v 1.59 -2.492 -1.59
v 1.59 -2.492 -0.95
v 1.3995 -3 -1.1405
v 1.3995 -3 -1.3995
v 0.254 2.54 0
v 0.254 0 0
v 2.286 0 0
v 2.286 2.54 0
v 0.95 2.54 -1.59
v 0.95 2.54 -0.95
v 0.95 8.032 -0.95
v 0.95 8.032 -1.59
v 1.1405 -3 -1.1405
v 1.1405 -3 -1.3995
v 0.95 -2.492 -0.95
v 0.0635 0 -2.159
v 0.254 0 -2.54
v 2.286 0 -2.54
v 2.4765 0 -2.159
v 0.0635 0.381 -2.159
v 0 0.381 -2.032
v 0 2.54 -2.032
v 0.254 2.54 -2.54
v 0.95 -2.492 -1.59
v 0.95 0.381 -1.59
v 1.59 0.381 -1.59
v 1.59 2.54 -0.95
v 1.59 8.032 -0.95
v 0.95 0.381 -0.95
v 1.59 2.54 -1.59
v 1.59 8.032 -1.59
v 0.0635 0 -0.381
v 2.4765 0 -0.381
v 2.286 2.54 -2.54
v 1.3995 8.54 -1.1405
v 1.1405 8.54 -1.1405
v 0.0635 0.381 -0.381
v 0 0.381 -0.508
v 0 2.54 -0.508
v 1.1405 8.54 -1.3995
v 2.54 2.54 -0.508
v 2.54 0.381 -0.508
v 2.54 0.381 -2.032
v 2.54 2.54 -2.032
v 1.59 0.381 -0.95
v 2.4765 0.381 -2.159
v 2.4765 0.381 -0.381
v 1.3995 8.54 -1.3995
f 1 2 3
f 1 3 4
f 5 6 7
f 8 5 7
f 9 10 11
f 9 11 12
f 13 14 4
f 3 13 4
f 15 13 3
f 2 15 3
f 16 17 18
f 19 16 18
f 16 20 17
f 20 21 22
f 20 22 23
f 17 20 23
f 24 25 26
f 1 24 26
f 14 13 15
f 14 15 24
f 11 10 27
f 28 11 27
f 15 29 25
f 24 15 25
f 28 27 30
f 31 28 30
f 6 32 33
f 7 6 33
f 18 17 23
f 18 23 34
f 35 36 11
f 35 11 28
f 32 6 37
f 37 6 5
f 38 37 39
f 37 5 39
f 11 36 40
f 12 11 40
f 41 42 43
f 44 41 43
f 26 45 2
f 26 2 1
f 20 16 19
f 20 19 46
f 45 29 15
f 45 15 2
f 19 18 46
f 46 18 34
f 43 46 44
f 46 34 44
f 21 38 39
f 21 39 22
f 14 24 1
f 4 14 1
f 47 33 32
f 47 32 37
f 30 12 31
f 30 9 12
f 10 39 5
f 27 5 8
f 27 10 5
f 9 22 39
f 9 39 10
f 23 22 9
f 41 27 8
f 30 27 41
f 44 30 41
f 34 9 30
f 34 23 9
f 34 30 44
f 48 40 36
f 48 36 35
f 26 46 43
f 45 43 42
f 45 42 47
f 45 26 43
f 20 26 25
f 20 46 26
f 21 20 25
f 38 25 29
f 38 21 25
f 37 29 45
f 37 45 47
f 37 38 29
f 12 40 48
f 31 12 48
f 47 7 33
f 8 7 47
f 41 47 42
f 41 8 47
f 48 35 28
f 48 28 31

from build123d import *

# Parameters (mm, degrees)
SKETCH1_W             = 2.54
SKETCH1_H             = 2.54
MAIN_BODY_DEPTH       = 2.54
SKETCH3_W             = 1.778
SKETCH3_H             = 0.381
CUT_EXTRUDE1_DEPTH    = 3.54
CUT_EXTRUDE2_DEPTH    = 3.54
SKETCH2_W             = 0.64
SKETCH2_H             = 0.64
PIN_DEPTH             = 6
PIN_DEPTH_BACK        = 5.54
CHAMFER1_SIZE         = 0.508
CHAMFER1_SIZE2        = 0.1905
CHAMFER1_PART_2_SIZE  = 0.508
CHAMFER1_PART_2_SIZE2 = 0.1905
CHAMFER1_PART_3_SIZE  = 0.508
CHAMFER1_PART_3_SIZE2 = 0.1905
CHAMFER1_PART_4_SIZE  = 0.508
CHAMFER1_PART_4_SIZE2 = 0.1905
CHAMFER2_SIZE         = 0.1905
CHAMFER2_SIZE2        = 0.508


with BuildPart() as part:
    # Sketch1 → Main Body (new body)
    with BuildSketch(Plane(origin=(0, 0, 0), x_dir=(1, 0, 0), z_dir=(0, 1, 0))):
        with Locations((1.27, 1.27)):
            Rectangle(SKETCH1_W, SKETCH1_H)
    extrude(amount=MAIN_BODY_DEPTH)

    # Sketch3 → Cut-Extrude1 (cut, through all)
    with BuildSketch(Plane.ZY):
        with Locations((-1.27, 0.1905)):
            Rectangle(SKETCH3_W, SKETCH3_H)
    extrude(amount=-CUT_EXTRUDE1_DEPTH, mode=Mode.SUBTRACT)

    # Sketch4 → Cut-Extrude2 (cut, through all)
    with BuildSketch(Plane(origin=(0, 2.54, 0), x_dir=(1, 0, 0), z_dir=(0, 1, 0))):
        Polygon((0.254, 2.54), (0, 2.54), (0, 2.032), align=None)
        Polygon((2.54, 2.54), (2.286, 2.54), (2.54, 2.032), align=None)
        Polygon((0.254, 0), (0, 0.508), (0, 0), align=None)
        Polygon((2.54, 0), (2.286, 0), (2.54, 0.508), align=None)
    extrude(amount=-CUT_EXTRUDE2_DEPTH, mode=Mode.SUBTRACT)

    # Sketch2 → Pin (add, two sides)
    with BuildSketch(Plane(origin=(0, 2.54, 0), x_dir=(1, 0, 0), z_dir=(0, 1, 0))) as pin_sk:
        with Locations((1.27, 1.27)):
            Rectangle(SKETCH2_W, SKETCH2_H)
    extrude(amount=PIN_DEPTH)
    extrude(pin_sk.sketch, amount=-PIN_DEPTH_BACK)

    # Chamfer1
    chamfer1_edges = [part.edges().sort_by_distance(p)[0] for p in [
        (0.95, 8.54, -1.27),
    ]]
    chamfer1_side = [part.faces().sort_by_distance(p)[0] for p in [
        (0.95, 5.54, -1.27),
    ]]
    chamfer(chamfer1_edges, length=CHAMFER1_SIZE, length2=CHAMFER1_SIZE2, reference=chamfer1_side[0])

    # Chamfer1 part 2
    chamfer1_part_2_edges = [part.edges().sort_by_distance(p)[0] for p in [
        (1.27, 8.54, -0.95),
    ]]
    chamfer1_part_2_side = [part.faces().sort_by_distance(p)[0] for p in [
        (1.27, 5.54, -0.95),
    ]]
    chamfer(chamfer1_part_2_edges, length=CHAMFER1_PART_2_SIZE, length2=CHAMFER1_PART_2_SIZE2, reference=chamfer1_part_2_side[0])

    # Chamfer1 part 3
    chamfer1_part_3_edges = [part.edges().sort_by_distance(p)[0] for p in [
        (1.59, 8.54, -1.27),
    ]]
    chamfer1_part_3_side = [part.faces().sort_by_distance(p)[0] for p in [
        (1.59, 5.54, -1.27),
    ]]
    chamfer(chamfer1_part_3_edges, length=CHAMFER1_PART_3_SIZE, length2=CHAMFER1_PART_3_SIZE2, reference=chamfer1_part_3_side[0])

    # Chamfer1 part 4
    chamfer1_part_4_edges = [part.edges().sort_by_distance(p)[0] for p in [
        (1.27, 8.54, -1.59),
    ]]
    chamfer1_part_4_side = [part.faces().sort_by_distance(p)[0] for p in [
        (1.27, 5.54, -1.59),
    ]]
    chamfer(chamfer1_part_4_edges, length=CHAMFER1_PART_4_SIZE, length2=CHAMFER1_PART_4_SIZE2, reference=chamfer1_part_4_side[0])

    # Chamfer2
    chamfer2_edges = [part.edges().sort_by_distance(p)[0] for p in [
        (1.27, -3, -1.59),
        (0.95, -3, -1.27),
        (1.27, -3, -0.95),
        (1.59, -3, -1.27),
    ]]
    chamfer2_side = [part.faces().sort_by_distance(p)[0] for p in [
        (1.27, -3, -1.27),
    ]]
    chamfer(chamfer2_edges, length=CHAMFER2_SIZE, length2=CHAMFER2_SIZE2, reference=chamfer2_side[0])


solid = part.part
